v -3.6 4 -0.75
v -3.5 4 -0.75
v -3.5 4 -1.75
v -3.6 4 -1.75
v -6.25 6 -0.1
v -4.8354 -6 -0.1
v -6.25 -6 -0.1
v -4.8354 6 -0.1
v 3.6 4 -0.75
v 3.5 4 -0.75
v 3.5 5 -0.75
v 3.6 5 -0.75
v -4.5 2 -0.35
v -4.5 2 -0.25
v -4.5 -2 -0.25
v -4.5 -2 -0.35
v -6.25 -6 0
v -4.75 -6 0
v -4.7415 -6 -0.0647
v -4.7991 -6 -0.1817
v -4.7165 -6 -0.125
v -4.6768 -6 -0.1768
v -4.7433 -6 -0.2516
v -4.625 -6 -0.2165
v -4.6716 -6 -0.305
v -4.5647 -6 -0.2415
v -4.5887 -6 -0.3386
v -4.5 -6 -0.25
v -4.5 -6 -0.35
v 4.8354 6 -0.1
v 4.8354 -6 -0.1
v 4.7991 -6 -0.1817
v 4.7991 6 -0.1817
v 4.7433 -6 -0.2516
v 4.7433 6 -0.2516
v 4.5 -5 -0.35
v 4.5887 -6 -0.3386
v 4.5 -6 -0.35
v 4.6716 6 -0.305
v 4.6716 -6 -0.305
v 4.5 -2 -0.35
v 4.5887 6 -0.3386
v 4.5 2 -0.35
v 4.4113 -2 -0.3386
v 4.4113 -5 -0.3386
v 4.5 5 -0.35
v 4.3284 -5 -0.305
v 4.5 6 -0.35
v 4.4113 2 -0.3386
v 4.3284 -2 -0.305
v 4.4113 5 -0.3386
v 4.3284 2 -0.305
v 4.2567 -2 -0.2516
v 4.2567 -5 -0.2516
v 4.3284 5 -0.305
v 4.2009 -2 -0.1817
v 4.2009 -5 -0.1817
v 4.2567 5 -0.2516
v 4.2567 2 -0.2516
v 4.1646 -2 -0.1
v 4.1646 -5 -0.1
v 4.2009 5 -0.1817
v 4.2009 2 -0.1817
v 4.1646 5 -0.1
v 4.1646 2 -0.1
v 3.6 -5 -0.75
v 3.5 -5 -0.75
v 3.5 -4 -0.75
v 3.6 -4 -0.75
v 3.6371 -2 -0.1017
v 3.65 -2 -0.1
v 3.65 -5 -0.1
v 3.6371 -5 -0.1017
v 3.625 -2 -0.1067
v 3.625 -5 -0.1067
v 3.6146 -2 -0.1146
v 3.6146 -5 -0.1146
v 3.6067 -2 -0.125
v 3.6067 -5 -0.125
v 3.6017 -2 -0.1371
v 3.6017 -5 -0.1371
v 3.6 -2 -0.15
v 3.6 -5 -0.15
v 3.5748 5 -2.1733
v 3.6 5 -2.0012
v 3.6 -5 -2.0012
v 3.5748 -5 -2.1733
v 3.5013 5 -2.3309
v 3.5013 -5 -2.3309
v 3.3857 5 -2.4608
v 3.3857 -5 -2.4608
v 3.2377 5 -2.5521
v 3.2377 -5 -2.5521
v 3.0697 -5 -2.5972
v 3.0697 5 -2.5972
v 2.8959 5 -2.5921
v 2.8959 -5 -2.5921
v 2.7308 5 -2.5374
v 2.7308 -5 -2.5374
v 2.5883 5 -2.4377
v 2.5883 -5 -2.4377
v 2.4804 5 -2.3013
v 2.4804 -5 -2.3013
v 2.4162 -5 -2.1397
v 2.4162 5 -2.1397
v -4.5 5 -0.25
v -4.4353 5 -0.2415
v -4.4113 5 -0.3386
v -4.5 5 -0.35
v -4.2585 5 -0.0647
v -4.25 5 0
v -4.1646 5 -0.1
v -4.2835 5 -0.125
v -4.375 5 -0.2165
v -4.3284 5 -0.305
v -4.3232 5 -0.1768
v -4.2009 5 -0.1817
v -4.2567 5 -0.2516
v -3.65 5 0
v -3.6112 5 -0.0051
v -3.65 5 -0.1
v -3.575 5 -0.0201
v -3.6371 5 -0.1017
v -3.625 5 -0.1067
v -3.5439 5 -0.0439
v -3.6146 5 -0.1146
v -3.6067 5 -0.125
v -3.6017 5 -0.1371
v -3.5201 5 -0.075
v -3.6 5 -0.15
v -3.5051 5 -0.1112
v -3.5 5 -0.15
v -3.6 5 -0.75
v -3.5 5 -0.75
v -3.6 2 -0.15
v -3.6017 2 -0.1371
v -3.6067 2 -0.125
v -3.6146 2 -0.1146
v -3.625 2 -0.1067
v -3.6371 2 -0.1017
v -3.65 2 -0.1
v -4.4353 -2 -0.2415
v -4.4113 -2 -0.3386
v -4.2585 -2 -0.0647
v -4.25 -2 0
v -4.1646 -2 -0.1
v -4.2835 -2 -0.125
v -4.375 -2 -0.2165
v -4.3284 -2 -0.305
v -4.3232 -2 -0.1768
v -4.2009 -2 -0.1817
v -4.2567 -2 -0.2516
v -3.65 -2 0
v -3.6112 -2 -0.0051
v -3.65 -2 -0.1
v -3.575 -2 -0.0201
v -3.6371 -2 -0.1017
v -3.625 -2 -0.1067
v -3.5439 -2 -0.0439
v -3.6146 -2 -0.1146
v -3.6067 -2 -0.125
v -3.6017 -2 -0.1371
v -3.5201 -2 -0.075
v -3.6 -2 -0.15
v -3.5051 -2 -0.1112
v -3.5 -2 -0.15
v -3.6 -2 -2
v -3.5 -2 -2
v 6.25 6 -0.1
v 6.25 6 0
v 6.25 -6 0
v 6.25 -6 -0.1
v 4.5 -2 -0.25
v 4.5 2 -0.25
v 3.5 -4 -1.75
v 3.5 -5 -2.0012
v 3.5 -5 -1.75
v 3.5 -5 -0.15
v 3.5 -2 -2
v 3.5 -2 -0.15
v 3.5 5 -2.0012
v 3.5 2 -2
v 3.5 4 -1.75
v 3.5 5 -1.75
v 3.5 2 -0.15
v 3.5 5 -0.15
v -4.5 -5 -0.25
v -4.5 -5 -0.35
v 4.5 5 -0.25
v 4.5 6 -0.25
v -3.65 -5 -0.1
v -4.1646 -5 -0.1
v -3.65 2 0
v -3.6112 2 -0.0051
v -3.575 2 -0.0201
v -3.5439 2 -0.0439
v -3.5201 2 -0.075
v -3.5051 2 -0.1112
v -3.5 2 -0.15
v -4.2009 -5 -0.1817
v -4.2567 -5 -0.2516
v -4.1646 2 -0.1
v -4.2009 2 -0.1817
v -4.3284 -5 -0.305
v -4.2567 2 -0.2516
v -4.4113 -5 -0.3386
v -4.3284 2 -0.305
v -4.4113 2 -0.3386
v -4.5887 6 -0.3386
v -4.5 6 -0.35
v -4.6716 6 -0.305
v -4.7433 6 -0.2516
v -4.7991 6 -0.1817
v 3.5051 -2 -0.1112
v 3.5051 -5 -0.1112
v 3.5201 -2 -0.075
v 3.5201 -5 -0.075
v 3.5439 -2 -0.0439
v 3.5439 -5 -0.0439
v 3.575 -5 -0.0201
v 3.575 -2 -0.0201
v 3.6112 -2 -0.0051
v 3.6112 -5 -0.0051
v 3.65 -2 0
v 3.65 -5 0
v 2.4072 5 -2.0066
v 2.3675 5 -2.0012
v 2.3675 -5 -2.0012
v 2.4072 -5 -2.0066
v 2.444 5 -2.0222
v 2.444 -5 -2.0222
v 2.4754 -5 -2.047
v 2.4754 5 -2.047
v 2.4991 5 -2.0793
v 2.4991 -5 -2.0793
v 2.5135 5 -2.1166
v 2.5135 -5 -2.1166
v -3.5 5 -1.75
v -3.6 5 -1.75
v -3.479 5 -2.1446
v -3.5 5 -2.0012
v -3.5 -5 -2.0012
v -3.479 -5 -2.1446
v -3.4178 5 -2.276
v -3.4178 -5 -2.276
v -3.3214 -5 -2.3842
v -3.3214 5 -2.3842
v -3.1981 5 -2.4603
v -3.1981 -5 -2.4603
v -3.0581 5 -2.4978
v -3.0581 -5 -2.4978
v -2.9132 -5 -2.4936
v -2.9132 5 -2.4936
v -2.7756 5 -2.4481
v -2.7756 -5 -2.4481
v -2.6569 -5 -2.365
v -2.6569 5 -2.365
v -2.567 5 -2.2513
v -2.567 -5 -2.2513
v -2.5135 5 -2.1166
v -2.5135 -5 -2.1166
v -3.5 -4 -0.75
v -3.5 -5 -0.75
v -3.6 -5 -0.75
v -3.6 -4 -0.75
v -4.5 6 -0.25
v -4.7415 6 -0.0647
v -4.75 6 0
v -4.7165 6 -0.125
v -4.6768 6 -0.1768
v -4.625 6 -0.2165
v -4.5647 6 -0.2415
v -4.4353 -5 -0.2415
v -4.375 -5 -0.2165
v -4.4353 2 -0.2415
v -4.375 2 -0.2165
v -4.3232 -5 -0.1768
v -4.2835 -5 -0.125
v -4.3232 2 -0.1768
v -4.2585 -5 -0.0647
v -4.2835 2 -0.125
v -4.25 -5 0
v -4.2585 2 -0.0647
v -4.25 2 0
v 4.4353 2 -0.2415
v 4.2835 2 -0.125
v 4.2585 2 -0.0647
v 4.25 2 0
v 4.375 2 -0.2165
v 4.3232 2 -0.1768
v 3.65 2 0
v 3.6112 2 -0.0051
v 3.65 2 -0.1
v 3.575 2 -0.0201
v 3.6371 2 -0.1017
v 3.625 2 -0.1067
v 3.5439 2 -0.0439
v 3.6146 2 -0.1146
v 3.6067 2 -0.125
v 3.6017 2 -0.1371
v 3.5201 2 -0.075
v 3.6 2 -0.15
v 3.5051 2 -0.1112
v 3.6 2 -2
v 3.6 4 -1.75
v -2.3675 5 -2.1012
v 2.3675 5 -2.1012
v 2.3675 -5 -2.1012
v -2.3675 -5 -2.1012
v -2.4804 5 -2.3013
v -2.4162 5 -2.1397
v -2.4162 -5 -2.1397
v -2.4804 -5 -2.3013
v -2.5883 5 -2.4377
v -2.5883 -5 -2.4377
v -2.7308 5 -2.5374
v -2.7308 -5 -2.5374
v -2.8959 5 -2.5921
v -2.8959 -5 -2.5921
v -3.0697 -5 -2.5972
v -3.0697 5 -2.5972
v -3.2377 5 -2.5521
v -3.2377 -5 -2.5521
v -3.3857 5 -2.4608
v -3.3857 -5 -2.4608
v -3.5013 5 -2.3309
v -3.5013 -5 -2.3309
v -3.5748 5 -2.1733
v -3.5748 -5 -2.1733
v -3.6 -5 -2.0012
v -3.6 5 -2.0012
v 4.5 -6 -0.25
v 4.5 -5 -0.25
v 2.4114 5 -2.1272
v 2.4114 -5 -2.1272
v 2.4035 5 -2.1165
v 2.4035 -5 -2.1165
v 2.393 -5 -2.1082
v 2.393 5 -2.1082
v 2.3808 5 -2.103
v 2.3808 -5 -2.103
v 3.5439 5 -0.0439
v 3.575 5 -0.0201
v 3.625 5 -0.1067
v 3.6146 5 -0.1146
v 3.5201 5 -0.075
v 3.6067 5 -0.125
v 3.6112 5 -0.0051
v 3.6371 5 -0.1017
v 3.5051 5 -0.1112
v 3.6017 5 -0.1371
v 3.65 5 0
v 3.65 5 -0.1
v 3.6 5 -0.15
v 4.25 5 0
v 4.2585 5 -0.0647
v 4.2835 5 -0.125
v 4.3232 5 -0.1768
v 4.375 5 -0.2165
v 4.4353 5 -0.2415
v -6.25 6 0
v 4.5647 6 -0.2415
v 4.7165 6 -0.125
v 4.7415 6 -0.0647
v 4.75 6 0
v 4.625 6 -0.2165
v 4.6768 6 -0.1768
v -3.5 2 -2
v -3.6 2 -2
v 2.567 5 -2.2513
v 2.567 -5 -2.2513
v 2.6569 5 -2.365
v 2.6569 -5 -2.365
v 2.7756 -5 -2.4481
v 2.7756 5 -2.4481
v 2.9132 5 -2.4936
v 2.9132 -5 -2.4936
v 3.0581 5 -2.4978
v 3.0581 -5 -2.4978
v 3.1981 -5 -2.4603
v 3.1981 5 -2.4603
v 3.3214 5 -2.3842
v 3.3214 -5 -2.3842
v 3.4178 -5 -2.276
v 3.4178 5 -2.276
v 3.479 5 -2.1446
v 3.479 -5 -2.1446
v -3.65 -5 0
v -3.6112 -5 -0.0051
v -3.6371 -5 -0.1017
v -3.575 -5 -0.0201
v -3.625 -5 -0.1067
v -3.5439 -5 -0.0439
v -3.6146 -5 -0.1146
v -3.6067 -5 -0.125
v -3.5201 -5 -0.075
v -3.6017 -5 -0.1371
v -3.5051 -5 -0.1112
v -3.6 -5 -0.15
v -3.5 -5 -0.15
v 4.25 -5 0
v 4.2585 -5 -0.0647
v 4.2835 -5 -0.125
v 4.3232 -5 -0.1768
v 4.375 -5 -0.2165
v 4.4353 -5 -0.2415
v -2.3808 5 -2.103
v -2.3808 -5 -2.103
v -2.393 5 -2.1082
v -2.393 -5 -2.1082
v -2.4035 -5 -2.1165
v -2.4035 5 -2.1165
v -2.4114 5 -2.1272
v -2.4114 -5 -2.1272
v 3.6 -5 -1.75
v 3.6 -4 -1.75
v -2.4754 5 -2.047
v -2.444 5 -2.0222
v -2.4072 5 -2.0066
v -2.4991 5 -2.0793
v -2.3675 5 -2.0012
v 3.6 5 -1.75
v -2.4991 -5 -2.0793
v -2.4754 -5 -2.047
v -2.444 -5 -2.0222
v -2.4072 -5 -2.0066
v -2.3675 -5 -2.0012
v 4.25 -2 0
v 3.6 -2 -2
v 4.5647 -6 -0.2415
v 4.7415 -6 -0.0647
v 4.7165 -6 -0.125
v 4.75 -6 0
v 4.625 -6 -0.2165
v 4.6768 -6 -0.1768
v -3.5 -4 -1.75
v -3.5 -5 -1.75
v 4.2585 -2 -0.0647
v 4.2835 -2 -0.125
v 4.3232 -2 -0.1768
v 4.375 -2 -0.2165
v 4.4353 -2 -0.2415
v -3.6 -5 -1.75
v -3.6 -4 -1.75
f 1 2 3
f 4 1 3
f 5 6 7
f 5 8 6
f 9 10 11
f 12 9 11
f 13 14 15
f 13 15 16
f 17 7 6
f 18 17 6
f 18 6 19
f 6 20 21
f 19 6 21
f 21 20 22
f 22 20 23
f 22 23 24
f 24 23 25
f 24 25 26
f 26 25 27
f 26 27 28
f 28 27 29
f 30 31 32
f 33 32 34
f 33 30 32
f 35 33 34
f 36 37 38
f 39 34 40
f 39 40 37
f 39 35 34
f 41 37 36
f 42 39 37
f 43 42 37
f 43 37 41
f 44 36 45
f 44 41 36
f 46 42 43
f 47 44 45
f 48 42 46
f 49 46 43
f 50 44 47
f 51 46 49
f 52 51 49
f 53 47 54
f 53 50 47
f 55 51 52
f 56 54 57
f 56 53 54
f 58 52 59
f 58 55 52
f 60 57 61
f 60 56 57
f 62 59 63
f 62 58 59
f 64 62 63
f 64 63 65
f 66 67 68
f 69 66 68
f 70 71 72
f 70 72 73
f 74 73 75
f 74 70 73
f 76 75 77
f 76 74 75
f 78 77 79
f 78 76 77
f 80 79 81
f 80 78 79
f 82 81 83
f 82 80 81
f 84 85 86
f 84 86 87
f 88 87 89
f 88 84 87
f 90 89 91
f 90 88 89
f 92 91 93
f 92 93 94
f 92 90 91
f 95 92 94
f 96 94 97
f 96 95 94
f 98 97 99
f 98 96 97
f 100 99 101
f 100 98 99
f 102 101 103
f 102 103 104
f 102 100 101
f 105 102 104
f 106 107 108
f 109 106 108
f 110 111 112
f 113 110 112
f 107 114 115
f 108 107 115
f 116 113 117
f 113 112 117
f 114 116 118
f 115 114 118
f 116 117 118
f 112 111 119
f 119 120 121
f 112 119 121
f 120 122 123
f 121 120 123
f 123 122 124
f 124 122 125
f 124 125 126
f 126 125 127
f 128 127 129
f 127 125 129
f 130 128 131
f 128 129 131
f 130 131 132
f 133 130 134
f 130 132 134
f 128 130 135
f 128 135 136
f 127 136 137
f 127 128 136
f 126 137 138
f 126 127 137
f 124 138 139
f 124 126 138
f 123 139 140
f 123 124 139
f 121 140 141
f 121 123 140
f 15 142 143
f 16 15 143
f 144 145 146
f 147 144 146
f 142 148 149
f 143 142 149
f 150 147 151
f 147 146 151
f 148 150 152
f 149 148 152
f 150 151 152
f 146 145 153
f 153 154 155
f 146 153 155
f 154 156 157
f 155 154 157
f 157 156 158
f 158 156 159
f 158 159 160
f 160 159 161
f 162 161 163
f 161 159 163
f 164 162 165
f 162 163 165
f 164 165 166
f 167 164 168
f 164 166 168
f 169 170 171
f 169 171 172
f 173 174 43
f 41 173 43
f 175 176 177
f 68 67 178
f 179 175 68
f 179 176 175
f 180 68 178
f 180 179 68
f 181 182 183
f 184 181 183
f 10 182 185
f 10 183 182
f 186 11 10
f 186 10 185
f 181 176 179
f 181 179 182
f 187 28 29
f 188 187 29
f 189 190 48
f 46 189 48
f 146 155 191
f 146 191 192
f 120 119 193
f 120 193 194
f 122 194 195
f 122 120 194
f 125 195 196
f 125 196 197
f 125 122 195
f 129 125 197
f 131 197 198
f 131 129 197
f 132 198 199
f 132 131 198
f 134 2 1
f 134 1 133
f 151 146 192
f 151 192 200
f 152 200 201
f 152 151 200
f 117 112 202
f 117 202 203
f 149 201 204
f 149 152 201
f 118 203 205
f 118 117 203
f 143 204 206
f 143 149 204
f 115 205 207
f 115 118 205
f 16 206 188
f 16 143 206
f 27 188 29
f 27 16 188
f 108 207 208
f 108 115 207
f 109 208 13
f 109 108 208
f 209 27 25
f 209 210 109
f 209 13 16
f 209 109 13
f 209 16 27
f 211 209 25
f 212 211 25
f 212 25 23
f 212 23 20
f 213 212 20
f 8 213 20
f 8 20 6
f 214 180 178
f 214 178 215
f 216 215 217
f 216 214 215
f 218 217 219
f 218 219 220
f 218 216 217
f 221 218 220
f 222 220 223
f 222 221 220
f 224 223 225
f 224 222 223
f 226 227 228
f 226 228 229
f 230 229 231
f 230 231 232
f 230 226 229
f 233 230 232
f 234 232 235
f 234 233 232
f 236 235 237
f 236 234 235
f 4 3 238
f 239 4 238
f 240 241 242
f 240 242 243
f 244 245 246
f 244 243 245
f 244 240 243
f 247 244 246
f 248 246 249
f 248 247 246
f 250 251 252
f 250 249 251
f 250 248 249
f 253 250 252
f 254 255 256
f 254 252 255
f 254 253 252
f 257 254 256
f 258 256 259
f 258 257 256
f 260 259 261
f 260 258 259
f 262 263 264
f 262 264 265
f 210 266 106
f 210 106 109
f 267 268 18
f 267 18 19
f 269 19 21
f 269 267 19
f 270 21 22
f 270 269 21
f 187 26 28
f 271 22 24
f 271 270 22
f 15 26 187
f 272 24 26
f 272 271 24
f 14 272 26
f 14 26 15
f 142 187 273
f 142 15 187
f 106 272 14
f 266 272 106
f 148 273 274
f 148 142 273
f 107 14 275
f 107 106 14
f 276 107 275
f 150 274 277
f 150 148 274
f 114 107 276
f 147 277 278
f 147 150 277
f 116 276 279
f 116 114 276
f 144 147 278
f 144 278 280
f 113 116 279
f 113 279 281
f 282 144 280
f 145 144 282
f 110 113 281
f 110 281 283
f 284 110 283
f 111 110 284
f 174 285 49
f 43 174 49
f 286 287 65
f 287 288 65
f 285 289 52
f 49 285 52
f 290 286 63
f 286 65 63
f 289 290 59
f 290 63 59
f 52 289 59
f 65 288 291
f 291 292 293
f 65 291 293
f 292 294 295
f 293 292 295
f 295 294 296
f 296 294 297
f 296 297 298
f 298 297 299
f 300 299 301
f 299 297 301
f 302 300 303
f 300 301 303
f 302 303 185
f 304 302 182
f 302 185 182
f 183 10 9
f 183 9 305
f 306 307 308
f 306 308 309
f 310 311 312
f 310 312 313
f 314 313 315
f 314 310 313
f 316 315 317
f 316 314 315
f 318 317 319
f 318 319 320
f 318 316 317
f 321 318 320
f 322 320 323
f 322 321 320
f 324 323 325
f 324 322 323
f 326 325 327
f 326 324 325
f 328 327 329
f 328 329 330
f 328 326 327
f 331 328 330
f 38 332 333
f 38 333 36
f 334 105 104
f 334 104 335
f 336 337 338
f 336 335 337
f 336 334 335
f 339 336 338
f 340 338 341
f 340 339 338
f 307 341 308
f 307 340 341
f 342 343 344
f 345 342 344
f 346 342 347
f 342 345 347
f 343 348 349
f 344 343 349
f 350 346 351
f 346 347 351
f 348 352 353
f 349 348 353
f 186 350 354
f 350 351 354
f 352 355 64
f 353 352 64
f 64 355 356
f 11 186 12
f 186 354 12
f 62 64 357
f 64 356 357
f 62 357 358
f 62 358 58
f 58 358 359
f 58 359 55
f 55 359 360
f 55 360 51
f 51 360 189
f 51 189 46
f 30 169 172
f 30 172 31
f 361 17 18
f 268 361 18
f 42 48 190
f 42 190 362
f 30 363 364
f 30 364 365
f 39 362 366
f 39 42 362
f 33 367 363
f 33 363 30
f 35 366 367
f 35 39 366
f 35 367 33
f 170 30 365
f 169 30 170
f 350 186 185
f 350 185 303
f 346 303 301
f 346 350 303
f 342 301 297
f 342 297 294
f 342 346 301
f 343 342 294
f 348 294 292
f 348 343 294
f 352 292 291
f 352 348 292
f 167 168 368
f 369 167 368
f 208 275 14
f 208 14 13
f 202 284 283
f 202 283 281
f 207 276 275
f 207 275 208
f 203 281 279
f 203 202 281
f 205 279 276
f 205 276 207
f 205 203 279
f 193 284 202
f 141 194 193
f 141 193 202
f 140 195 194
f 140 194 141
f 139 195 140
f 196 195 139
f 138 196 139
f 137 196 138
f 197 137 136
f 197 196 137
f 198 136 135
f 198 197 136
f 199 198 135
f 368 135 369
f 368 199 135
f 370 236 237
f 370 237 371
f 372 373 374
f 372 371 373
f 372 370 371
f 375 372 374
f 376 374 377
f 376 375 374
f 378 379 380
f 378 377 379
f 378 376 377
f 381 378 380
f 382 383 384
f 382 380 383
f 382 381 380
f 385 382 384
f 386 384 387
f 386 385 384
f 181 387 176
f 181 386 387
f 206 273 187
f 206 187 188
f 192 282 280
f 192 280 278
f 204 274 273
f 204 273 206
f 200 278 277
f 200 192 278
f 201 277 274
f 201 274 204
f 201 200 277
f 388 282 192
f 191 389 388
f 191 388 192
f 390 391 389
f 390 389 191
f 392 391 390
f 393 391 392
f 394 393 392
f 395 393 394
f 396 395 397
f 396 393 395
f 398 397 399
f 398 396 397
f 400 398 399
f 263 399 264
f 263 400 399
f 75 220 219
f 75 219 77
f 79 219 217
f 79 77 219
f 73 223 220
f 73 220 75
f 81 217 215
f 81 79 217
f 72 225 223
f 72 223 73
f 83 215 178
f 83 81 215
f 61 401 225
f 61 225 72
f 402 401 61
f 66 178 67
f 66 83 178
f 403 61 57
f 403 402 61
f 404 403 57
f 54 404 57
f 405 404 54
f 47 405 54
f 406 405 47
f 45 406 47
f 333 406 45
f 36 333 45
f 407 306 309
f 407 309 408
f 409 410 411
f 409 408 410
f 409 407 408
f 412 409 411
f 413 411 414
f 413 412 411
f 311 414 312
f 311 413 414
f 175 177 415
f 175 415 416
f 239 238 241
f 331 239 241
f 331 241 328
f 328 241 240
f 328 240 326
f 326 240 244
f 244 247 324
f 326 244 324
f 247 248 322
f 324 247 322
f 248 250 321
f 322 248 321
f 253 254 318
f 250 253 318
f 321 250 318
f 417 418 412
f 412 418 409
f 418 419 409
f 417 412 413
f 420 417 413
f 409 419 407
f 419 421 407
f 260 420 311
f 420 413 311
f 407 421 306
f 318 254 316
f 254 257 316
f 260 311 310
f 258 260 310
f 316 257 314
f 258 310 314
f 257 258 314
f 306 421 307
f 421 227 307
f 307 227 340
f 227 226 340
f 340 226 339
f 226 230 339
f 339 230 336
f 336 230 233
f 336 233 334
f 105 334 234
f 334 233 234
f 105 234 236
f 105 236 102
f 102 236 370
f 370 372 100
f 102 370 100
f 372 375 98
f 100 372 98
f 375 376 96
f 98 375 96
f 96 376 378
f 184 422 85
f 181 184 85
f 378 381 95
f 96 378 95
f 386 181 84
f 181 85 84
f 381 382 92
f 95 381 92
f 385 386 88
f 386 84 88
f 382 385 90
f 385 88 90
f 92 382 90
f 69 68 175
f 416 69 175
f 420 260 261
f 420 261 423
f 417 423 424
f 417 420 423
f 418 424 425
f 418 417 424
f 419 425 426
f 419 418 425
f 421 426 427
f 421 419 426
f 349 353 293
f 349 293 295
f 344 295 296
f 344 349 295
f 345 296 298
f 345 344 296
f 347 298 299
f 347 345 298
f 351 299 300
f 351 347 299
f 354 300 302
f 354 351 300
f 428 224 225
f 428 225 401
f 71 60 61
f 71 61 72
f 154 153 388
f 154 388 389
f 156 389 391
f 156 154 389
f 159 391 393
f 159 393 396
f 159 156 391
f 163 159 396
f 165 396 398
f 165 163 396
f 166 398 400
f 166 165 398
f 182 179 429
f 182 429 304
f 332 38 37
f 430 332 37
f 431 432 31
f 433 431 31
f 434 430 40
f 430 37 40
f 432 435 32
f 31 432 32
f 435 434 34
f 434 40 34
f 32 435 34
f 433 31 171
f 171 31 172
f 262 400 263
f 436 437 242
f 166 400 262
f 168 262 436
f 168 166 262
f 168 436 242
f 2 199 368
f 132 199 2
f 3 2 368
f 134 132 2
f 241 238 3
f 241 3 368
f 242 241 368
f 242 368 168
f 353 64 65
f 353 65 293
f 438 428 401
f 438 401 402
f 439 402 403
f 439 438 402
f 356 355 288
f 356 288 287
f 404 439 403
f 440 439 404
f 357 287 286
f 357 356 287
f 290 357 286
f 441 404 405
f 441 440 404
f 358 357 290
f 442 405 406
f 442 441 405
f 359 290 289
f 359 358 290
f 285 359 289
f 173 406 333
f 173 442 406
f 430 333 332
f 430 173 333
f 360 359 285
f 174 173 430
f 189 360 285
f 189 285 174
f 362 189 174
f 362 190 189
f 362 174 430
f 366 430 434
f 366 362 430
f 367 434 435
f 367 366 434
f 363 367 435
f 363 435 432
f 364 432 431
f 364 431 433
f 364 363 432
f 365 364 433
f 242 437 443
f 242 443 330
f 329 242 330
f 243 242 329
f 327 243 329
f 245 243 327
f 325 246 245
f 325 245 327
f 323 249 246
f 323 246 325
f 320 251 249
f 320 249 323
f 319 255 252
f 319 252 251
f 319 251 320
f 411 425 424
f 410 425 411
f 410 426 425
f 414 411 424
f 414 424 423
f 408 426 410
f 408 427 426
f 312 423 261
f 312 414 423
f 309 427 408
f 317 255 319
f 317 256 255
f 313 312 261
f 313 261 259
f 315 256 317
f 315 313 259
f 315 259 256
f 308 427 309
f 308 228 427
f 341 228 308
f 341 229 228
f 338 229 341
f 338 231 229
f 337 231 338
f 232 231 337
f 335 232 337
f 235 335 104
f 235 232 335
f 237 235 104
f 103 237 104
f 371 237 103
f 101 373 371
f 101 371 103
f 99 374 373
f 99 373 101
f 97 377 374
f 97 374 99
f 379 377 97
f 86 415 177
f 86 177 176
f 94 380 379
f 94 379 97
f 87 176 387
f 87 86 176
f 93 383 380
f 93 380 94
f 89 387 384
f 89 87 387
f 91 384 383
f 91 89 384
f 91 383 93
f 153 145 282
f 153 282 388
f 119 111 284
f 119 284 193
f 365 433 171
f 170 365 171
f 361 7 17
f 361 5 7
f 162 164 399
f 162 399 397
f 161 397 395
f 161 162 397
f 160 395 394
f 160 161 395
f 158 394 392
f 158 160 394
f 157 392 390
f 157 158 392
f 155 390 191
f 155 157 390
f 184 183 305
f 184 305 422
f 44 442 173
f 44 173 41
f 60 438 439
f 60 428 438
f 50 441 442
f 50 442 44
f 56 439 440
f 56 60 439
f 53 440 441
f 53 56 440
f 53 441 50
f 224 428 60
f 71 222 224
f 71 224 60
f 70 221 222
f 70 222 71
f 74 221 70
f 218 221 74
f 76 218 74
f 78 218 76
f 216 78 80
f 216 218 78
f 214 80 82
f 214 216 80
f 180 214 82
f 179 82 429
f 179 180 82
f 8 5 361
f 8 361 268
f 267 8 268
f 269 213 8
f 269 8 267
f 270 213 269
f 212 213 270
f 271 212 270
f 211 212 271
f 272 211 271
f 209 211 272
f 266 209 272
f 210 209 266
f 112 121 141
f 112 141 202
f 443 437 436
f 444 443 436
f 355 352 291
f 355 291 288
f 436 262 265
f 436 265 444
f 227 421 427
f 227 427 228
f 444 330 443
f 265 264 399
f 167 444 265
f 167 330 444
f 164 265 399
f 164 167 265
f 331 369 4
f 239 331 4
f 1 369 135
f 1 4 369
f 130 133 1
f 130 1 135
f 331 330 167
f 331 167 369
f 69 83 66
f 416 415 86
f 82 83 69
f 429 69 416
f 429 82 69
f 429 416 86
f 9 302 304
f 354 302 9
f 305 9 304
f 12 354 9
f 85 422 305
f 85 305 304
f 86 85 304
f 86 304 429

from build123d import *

# Parameters (mm, degrees)
EXTRUDE_THIN1_DEPTH      = 6
EXTRUDE_THIN1_DEPTH_BACK = 6
SKETCH2_W                = 2
SKETCH2_H                = 4
SKETCH2_W_2              = 3
SKETCH2_H_2              = 1
EXTRUDE1_DEPTH           = 4.5
EXTRUDE1_DEPTH_BACK      = 4.5
SKETCH3_W                = 1
SKETCH3_H                = 1
EXTRUDE2_DEPTH           = 10
EXTRUDE2_DEPTH_BACK      = 10


with BuildPart() as part:
    # Sketch1 → Extrude-Thin1 (new body, two sides)
    with BuildSketch(Plane(origin=(0, 0, 0), x_dir=(1, 0, 0), z_dir=(0, 1, 0))) as extrude_thin1_sk:
        with BuildLine():
            Line((-6.25, 0), (-4.75, 0))
            ThreePointArc((-4.75, 0), (-4.5, 0.25), (-4.25, 0))
            Line((-4.25, 0), (-3.65, 0))
            ThreePointArc((-3.65, 0), (-3.543933983, 0.043933983), (-3.5, 0.15))
            Line((-3.5, 0.15), (-3.5, 2.001234471))
            ThreePointArc((-3.5, 2.001234471), (-3.058085593, 2.497849074), (-2.513495745, 2.116619086))
            ThreePointArc((-2.513495745, 2.116619086), (-2.460570519, 2.03356479), (-2.367544468, 2.001234471))
            Line((-2.367544468, 2.001234471), (2.367544468, 2.001234471))
            ThreePointArc((2.367544468, 2.001234471), (2.460570519, 2.03356479), (2.513495745, 2.116619086))
            ThreePointArc((2.513495745, 2.116619086), (3.058085593, 2.497849074), (3.5, 2.001234471))
            Line((3.5, 2.001234471), (3.5, 0.15))
            ThreePointArc((3.5, 0.15), (3.543933983, 0.043933983), (3.65, 0))
            Line((3.65, 0), (4.25, 0))
            ThreePointArc((4.25, 0), (4.5, 0.25), (4.75, 0))
            Line((4.75, 0), (6.25, 0))
            Line((6.25, 0), (6.25, 0.1))
            Line((6.25, 0.1), (4.835410197, 0.1))
            ThreePointArc((4.835410197, 0.1), (4.5, 0.35), (4.164589803, 0.1))
            Line((4.164589803, 0.1), (3.65, 0.1))
            ThreePointArc((3.65, 0.1), (3.614644661, 0.114644661), (3.6, 0.15))
            Line((3.6, 0.15), (3.6, 2.001234471))
            ThreePointArc((3.6, 2.001234471), (3.069702712, 2.597171994), (2.416194894, 2.139696009))
            ThreePointArc((2.416194894, 2.139696009), (2.398553152, 2.112011244), (2.367544468, 2.101234471))
            Line((2.367544468, 2.101234471), (-2.367544468, 2.101234471))
            ThreePointArc((-2.367544468, 2.101234471), (-2.398553152, 2.112011244), (-2.416194894, 2.139696009))
            ThreePointArc((-2.416194894, 2.139696009), (-3.069702712, 2.597171994), (-3.6, 2.001234471))
            Line((-3.6, 2.001234471), (-3.6, 0.15))
            ThreePointArc((-3.6, 0.15), (-3.614644661, 0.114644661), (-3.65, 0.1))
            Line((-3.65, 0.1), (-4.164589803, 0.1))
            ThreePointArc((-4.164589803, 0.1), (-4.5, 0.35), (-4.835410197, 0.1))
            Line((-4.835410197, 0.1), (-6.25, 0.1))
            Line((-6.25, 0.1), (-6.25, 0))
        make_face()
    extrude(amount=EXTRUDE_THIN1_DEPTH)
    extrude(extrude_thin1_sk.sketch, amount=-EXTRUDE_THIN1_DEPTH_BACK)

    # Sketch2 → Extrude1 (cut, two sides)
    with BuildSketch(Plane(origin=(0, 0, 0), x_dir=(0, 0, -1), z_dir=(1, 0, 0))) as extrude1_sk:
        with Locations((1, 0)):
            Rectangle(SKETCH2_W, SKETCH2_H)
        with Locations((1.5, -5.5)):
            Rectangle(SKETCH2_W_2, SKETCH2_H_2)
        with Locations((1.5, 5.5)):
            Rectangle(SKETCH2_W_2, SKETCH2_H_2)
    extrude(amount=EXTRUDE1_DEPTH, mode=Mode.SUBTRACT)
    extrude(extrude1_sk.sketch, amount=-EXTRUDE1_DEPTH_BACK, mode=Mode.SUBTRACT)

    # Sketch3 → Extrude2 (cut, two sides)
    with BuildSketch(Plane(origin=(0, 0, 0), x_dir=(0, 0, -1), z_dir=(1, 0, 0))) as extrude2_sk:
        with Locations((1.25, 4.5)):
            Rectangle(SKETCH3_W, SKETCH3_H)
        with Locations((1.25, -4.5)):
            Rectangle(SKETCH3_W, SKETCH3_H)
    extrude(amount=EXTRUDE2_DEPTH, mode=Mode.SUBTRACT)
    extrude(extrude2_sk.sketch, amount=-EXTRUDE2_DEPTH_BACK, mode=Mode.SUBTRACT)


solid = part.part
